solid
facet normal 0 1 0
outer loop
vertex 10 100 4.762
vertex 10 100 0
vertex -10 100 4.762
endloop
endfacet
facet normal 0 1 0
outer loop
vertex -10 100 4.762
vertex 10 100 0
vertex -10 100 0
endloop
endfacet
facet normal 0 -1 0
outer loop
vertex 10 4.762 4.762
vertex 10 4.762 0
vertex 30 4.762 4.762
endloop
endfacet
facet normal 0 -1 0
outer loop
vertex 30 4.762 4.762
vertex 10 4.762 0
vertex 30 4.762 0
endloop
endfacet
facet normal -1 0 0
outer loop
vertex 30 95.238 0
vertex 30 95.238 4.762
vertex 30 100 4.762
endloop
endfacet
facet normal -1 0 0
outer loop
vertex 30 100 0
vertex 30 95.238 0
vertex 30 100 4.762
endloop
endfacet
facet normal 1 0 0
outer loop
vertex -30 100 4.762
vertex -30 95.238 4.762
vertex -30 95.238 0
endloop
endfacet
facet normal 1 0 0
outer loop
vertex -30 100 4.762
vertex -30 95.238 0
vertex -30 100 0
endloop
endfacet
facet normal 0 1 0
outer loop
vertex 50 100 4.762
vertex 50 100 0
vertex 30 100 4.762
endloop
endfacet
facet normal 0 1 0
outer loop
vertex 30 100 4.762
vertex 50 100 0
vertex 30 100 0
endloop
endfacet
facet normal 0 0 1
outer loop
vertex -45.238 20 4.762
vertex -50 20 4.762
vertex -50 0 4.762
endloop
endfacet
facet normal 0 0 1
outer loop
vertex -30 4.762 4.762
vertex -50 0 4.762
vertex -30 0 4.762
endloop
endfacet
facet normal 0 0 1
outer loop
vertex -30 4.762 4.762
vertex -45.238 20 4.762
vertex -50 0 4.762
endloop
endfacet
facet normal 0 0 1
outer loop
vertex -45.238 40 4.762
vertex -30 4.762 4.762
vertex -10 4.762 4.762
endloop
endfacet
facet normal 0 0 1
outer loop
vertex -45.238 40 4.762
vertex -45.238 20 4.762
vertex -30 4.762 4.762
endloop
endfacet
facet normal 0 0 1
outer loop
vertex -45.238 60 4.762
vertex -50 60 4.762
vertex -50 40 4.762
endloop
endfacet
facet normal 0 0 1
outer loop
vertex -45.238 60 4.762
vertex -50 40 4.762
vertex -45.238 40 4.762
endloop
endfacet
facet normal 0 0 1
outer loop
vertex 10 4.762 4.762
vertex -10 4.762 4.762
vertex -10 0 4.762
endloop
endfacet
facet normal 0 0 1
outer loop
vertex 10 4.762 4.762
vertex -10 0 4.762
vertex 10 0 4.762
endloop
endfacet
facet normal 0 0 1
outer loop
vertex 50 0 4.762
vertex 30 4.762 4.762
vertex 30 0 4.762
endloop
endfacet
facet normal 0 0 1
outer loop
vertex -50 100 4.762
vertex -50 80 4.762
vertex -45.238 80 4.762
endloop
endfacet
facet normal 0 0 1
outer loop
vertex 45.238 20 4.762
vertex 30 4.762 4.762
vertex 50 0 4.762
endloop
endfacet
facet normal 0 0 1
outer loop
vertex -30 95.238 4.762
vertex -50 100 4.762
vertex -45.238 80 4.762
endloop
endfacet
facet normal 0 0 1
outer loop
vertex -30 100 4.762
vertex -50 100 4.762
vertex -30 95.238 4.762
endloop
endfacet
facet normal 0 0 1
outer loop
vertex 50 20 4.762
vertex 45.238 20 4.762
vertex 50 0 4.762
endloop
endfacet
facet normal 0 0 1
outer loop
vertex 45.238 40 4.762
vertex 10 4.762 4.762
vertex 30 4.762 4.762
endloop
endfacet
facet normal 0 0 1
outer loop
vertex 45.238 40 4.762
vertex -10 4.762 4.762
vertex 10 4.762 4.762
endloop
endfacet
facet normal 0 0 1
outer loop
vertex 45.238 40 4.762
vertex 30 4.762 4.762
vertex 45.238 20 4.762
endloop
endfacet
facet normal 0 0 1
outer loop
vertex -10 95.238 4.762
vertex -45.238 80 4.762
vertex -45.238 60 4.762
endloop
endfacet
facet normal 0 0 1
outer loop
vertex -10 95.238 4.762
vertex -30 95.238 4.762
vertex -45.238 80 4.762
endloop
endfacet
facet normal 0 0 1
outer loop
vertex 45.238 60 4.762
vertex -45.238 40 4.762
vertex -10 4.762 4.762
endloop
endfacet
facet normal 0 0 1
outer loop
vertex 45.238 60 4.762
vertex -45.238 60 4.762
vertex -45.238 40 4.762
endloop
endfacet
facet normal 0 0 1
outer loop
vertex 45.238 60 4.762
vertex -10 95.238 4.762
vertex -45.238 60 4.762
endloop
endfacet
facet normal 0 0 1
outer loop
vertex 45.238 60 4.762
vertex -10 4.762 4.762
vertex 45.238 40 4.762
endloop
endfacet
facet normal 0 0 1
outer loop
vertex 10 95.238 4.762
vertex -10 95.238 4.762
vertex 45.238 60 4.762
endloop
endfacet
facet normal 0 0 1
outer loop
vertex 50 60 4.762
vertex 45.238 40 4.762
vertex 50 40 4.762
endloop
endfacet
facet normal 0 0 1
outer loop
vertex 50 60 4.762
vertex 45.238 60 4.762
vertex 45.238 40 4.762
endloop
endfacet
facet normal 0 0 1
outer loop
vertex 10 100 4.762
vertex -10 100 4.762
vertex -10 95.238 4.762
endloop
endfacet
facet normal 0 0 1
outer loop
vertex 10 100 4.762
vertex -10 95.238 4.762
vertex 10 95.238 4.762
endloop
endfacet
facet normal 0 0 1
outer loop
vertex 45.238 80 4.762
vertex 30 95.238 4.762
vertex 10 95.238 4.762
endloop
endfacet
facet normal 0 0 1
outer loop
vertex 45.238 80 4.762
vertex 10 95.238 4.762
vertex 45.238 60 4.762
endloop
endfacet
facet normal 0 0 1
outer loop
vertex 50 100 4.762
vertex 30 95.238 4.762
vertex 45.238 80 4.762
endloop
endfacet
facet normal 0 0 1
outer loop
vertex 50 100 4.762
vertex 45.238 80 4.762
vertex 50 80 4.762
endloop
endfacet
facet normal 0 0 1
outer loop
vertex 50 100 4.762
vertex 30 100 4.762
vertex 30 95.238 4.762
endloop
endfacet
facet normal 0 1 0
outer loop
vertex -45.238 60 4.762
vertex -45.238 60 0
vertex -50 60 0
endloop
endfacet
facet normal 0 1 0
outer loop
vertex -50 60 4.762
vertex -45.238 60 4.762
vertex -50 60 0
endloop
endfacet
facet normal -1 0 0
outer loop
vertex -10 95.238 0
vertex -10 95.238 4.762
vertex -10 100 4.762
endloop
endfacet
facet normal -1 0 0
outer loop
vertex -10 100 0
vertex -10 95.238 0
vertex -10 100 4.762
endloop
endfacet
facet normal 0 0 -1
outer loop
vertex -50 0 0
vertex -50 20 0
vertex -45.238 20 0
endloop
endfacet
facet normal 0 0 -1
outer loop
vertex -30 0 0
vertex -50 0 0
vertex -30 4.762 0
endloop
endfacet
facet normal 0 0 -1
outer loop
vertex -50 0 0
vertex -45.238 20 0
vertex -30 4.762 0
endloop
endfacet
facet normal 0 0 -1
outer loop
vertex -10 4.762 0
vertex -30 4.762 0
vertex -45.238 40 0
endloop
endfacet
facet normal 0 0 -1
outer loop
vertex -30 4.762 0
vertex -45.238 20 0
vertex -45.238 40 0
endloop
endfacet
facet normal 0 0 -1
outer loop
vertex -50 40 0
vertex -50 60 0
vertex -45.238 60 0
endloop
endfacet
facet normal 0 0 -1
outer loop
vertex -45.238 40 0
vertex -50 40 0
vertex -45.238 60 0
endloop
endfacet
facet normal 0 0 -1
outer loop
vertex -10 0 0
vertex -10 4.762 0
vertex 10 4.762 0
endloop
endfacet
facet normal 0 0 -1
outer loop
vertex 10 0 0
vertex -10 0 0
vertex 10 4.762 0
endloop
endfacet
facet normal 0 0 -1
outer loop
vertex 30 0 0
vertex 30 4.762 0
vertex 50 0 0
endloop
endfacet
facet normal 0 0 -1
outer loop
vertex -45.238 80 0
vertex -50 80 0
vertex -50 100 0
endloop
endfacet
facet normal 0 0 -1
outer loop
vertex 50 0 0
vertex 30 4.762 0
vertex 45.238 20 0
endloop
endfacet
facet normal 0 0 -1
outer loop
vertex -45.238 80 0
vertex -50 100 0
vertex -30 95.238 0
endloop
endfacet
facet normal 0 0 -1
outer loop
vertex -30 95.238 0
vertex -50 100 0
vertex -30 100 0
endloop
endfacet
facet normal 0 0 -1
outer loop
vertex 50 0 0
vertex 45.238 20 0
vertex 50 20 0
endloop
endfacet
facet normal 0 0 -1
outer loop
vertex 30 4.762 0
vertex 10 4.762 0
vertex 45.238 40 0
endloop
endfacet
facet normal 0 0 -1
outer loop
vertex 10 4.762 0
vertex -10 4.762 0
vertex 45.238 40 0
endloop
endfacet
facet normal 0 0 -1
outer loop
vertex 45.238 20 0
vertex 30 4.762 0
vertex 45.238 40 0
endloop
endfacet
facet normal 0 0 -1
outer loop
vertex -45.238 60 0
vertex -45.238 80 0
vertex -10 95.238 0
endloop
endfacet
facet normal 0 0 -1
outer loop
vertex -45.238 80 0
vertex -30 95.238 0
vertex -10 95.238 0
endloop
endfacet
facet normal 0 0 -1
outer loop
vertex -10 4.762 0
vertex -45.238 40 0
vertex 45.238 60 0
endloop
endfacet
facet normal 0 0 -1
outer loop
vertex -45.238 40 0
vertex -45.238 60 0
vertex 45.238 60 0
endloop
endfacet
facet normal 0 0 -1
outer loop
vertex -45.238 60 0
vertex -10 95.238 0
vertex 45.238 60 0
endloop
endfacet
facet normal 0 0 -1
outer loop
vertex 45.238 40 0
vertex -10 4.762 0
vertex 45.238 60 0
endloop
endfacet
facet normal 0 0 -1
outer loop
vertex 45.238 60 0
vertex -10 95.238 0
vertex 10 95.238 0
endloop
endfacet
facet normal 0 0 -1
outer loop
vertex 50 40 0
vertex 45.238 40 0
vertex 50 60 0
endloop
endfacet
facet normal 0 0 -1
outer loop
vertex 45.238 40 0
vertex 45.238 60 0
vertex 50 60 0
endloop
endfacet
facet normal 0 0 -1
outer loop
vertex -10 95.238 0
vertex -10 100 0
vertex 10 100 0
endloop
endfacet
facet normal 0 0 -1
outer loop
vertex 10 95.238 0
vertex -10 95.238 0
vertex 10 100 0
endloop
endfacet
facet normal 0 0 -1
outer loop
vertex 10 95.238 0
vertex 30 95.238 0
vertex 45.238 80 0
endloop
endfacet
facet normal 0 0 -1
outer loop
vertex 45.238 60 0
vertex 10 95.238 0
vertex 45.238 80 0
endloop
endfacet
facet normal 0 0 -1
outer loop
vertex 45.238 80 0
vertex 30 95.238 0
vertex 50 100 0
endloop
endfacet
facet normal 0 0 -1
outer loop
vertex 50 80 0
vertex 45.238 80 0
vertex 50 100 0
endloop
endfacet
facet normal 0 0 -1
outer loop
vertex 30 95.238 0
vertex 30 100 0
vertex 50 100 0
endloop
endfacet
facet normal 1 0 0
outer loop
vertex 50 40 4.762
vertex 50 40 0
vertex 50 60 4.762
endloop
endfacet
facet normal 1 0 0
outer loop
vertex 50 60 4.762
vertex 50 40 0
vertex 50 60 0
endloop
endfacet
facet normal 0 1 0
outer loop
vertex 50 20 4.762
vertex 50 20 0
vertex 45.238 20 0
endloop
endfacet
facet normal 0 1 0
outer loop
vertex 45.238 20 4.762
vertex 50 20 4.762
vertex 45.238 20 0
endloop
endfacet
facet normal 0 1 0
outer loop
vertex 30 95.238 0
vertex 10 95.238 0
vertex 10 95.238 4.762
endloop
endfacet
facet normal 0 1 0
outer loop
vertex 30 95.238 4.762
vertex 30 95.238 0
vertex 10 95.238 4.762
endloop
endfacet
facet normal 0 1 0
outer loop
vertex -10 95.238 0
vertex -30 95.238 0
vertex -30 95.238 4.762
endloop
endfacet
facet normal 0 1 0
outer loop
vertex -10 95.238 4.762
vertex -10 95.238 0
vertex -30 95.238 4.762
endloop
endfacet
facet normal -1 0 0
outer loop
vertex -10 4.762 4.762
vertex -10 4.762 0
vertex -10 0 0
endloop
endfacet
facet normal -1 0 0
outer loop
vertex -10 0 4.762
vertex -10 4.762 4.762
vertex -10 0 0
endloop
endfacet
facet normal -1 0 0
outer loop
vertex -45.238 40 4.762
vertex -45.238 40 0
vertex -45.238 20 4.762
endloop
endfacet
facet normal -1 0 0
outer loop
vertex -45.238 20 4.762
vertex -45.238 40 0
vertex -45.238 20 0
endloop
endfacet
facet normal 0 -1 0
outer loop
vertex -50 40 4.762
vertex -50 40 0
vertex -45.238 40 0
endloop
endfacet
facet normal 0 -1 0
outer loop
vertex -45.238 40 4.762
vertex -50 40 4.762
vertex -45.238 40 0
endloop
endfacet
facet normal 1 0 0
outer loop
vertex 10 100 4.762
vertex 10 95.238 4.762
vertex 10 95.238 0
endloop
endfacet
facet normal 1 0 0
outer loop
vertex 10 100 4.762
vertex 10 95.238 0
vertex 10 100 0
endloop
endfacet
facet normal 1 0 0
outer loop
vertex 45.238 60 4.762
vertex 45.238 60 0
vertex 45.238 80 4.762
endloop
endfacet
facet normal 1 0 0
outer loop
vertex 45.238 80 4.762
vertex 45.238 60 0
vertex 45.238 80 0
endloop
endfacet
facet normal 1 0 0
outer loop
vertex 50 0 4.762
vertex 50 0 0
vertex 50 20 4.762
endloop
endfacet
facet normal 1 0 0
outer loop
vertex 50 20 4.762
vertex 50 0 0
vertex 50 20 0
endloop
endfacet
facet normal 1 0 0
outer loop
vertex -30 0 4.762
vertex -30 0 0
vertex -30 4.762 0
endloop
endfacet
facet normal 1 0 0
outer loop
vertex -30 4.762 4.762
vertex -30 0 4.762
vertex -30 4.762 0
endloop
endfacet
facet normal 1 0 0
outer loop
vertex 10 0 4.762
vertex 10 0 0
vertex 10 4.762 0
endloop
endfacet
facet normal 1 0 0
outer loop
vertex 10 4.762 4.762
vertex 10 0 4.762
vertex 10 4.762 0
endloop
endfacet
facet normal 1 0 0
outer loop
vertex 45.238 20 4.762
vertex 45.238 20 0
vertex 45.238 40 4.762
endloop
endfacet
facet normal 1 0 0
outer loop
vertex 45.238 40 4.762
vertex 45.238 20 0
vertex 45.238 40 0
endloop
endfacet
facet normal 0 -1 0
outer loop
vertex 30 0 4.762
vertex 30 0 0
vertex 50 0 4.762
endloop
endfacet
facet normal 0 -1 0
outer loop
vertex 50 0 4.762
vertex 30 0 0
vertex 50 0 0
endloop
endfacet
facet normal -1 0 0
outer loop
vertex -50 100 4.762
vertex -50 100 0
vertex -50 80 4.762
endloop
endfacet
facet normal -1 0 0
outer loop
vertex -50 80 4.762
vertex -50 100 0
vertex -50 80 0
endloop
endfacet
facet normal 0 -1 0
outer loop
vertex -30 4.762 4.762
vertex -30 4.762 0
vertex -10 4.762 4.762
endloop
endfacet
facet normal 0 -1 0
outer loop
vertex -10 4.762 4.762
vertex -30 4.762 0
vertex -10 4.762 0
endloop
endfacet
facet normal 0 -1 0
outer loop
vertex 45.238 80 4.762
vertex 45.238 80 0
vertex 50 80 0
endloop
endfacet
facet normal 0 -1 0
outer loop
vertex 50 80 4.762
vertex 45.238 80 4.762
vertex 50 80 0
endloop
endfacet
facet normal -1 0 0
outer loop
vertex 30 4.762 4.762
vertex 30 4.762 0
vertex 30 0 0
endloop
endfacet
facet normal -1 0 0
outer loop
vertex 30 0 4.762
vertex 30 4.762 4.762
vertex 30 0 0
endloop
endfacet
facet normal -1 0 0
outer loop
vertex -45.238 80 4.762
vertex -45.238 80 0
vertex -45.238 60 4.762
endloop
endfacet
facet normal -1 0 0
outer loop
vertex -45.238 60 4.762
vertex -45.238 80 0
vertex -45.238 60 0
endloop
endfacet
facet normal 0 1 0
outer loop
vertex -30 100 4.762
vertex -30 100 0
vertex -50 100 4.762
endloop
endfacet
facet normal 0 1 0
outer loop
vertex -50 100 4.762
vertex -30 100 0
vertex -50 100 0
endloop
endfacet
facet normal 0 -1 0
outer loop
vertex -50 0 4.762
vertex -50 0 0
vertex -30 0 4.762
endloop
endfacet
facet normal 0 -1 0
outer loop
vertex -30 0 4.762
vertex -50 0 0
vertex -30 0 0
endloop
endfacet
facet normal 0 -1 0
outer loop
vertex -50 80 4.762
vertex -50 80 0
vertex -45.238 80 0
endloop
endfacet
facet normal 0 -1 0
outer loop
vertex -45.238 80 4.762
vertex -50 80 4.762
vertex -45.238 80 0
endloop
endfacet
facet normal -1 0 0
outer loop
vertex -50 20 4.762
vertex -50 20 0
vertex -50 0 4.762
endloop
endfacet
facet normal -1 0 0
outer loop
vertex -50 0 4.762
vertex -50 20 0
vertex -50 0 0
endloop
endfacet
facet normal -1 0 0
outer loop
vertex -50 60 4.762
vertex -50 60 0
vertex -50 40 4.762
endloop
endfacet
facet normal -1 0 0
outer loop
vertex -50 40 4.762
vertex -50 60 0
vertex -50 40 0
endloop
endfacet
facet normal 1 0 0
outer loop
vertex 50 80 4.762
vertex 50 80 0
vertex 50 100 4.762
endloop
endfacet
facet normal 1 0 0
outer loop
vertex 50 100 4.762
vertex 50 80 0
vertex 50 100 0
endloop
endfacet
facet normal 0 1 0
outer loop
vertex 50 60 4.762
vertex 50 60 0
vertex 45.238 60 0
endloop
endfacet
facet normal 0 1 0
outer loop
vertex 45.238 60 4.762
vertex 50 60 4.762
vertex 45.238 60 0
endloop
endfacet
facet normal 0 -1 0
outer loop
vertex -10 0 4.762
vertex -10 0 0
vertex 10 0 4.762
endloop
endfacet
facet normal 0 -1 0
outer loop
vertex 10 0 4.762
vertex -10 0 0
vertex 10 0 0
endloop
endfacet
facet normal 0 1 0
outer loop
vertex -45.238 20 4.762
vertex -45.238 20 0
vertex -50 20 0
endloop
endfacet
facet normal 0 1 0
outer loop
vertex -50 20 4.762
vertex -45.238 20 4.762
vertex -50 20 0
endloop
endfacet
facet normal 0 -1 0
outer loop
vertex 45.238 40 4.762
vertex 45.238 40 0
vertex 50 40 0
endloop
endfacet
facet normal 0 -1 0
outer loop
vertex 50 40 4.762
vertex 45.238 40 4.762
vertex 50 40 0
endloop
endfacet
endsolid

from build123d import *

# Parameters (mm, degrees)
BOSS_EXTRUDE1_DEPTH = 4.7625
CAVITY1_START       = -30
CAVITY1_OUTLINE_W   = 4.7625
CAVITY1_OUTLINE_H   = 4.7625
CAVITY1_DEPTH       = 20
CAVITY1_START_2     = 10
CAVITY1_2_OUTLINE_W = 4.7625
CAVITY1_2_OUTLINE_H = 4.7625
CAVITY1_2_DEPTH     = 20


# Read off the part's stored shape, not the designer's step: Cavity1
with BuildPart() as part:
    # Sketch1 → Boss-Extrude1 (new body)
    with BuildSketch(Plane.XY):
        Polygon((50, 40), (50, 60), (45.2375, 60), (45.2375, 80), (50, 80), (50, 100), (-50, 100), (-50, 80), (-45.2375, 80), (-45.2375, 60), (-50, 60), (-50, 40), (-45.2375, 40), (-45.2375, 20), (-50, 20), (-50, 0), (-30, 0), (-30, 4.7625), (-10, 4.7625), (-10, 0), (10, 0), (10, 4.7625), (30, 4.7625), (30, 0), (50, 0), (50, 20), (45.2375, 20), (45.2375, 40), align=None)
    extrude(amount=BOSS_EXTRUDE1_DEPTH)

    # Cavity1 outline → Cavity1 (cut)
    with BuildSketch(Plane.YZ.offset(CAVITY1_START)):
        with Locations((97.61875, 2.38125)):
            Rectangle(CAVITY1_OUTLINE_W, CAVITY1_OUTLINE_H)
    extrude(amount=CAVITY1_DEPTH, mode=Mode.SUBTRACT)

    # Cavity1 2 outline → Cavity1 2 (cut)
    with BuildSketch(Plane.YZ.offset(CAVITY1_START_2)):
        with Locations((97.61875, 2.38125)):
            Rectangle(CAVITY1_2_OUTLINE_W, CAVITY1_2_OUTLINE_H)
    extrude(amount=CAVITY1_2_DEPTH, mode=Mode.SUBTRACT)


solid = part.part
